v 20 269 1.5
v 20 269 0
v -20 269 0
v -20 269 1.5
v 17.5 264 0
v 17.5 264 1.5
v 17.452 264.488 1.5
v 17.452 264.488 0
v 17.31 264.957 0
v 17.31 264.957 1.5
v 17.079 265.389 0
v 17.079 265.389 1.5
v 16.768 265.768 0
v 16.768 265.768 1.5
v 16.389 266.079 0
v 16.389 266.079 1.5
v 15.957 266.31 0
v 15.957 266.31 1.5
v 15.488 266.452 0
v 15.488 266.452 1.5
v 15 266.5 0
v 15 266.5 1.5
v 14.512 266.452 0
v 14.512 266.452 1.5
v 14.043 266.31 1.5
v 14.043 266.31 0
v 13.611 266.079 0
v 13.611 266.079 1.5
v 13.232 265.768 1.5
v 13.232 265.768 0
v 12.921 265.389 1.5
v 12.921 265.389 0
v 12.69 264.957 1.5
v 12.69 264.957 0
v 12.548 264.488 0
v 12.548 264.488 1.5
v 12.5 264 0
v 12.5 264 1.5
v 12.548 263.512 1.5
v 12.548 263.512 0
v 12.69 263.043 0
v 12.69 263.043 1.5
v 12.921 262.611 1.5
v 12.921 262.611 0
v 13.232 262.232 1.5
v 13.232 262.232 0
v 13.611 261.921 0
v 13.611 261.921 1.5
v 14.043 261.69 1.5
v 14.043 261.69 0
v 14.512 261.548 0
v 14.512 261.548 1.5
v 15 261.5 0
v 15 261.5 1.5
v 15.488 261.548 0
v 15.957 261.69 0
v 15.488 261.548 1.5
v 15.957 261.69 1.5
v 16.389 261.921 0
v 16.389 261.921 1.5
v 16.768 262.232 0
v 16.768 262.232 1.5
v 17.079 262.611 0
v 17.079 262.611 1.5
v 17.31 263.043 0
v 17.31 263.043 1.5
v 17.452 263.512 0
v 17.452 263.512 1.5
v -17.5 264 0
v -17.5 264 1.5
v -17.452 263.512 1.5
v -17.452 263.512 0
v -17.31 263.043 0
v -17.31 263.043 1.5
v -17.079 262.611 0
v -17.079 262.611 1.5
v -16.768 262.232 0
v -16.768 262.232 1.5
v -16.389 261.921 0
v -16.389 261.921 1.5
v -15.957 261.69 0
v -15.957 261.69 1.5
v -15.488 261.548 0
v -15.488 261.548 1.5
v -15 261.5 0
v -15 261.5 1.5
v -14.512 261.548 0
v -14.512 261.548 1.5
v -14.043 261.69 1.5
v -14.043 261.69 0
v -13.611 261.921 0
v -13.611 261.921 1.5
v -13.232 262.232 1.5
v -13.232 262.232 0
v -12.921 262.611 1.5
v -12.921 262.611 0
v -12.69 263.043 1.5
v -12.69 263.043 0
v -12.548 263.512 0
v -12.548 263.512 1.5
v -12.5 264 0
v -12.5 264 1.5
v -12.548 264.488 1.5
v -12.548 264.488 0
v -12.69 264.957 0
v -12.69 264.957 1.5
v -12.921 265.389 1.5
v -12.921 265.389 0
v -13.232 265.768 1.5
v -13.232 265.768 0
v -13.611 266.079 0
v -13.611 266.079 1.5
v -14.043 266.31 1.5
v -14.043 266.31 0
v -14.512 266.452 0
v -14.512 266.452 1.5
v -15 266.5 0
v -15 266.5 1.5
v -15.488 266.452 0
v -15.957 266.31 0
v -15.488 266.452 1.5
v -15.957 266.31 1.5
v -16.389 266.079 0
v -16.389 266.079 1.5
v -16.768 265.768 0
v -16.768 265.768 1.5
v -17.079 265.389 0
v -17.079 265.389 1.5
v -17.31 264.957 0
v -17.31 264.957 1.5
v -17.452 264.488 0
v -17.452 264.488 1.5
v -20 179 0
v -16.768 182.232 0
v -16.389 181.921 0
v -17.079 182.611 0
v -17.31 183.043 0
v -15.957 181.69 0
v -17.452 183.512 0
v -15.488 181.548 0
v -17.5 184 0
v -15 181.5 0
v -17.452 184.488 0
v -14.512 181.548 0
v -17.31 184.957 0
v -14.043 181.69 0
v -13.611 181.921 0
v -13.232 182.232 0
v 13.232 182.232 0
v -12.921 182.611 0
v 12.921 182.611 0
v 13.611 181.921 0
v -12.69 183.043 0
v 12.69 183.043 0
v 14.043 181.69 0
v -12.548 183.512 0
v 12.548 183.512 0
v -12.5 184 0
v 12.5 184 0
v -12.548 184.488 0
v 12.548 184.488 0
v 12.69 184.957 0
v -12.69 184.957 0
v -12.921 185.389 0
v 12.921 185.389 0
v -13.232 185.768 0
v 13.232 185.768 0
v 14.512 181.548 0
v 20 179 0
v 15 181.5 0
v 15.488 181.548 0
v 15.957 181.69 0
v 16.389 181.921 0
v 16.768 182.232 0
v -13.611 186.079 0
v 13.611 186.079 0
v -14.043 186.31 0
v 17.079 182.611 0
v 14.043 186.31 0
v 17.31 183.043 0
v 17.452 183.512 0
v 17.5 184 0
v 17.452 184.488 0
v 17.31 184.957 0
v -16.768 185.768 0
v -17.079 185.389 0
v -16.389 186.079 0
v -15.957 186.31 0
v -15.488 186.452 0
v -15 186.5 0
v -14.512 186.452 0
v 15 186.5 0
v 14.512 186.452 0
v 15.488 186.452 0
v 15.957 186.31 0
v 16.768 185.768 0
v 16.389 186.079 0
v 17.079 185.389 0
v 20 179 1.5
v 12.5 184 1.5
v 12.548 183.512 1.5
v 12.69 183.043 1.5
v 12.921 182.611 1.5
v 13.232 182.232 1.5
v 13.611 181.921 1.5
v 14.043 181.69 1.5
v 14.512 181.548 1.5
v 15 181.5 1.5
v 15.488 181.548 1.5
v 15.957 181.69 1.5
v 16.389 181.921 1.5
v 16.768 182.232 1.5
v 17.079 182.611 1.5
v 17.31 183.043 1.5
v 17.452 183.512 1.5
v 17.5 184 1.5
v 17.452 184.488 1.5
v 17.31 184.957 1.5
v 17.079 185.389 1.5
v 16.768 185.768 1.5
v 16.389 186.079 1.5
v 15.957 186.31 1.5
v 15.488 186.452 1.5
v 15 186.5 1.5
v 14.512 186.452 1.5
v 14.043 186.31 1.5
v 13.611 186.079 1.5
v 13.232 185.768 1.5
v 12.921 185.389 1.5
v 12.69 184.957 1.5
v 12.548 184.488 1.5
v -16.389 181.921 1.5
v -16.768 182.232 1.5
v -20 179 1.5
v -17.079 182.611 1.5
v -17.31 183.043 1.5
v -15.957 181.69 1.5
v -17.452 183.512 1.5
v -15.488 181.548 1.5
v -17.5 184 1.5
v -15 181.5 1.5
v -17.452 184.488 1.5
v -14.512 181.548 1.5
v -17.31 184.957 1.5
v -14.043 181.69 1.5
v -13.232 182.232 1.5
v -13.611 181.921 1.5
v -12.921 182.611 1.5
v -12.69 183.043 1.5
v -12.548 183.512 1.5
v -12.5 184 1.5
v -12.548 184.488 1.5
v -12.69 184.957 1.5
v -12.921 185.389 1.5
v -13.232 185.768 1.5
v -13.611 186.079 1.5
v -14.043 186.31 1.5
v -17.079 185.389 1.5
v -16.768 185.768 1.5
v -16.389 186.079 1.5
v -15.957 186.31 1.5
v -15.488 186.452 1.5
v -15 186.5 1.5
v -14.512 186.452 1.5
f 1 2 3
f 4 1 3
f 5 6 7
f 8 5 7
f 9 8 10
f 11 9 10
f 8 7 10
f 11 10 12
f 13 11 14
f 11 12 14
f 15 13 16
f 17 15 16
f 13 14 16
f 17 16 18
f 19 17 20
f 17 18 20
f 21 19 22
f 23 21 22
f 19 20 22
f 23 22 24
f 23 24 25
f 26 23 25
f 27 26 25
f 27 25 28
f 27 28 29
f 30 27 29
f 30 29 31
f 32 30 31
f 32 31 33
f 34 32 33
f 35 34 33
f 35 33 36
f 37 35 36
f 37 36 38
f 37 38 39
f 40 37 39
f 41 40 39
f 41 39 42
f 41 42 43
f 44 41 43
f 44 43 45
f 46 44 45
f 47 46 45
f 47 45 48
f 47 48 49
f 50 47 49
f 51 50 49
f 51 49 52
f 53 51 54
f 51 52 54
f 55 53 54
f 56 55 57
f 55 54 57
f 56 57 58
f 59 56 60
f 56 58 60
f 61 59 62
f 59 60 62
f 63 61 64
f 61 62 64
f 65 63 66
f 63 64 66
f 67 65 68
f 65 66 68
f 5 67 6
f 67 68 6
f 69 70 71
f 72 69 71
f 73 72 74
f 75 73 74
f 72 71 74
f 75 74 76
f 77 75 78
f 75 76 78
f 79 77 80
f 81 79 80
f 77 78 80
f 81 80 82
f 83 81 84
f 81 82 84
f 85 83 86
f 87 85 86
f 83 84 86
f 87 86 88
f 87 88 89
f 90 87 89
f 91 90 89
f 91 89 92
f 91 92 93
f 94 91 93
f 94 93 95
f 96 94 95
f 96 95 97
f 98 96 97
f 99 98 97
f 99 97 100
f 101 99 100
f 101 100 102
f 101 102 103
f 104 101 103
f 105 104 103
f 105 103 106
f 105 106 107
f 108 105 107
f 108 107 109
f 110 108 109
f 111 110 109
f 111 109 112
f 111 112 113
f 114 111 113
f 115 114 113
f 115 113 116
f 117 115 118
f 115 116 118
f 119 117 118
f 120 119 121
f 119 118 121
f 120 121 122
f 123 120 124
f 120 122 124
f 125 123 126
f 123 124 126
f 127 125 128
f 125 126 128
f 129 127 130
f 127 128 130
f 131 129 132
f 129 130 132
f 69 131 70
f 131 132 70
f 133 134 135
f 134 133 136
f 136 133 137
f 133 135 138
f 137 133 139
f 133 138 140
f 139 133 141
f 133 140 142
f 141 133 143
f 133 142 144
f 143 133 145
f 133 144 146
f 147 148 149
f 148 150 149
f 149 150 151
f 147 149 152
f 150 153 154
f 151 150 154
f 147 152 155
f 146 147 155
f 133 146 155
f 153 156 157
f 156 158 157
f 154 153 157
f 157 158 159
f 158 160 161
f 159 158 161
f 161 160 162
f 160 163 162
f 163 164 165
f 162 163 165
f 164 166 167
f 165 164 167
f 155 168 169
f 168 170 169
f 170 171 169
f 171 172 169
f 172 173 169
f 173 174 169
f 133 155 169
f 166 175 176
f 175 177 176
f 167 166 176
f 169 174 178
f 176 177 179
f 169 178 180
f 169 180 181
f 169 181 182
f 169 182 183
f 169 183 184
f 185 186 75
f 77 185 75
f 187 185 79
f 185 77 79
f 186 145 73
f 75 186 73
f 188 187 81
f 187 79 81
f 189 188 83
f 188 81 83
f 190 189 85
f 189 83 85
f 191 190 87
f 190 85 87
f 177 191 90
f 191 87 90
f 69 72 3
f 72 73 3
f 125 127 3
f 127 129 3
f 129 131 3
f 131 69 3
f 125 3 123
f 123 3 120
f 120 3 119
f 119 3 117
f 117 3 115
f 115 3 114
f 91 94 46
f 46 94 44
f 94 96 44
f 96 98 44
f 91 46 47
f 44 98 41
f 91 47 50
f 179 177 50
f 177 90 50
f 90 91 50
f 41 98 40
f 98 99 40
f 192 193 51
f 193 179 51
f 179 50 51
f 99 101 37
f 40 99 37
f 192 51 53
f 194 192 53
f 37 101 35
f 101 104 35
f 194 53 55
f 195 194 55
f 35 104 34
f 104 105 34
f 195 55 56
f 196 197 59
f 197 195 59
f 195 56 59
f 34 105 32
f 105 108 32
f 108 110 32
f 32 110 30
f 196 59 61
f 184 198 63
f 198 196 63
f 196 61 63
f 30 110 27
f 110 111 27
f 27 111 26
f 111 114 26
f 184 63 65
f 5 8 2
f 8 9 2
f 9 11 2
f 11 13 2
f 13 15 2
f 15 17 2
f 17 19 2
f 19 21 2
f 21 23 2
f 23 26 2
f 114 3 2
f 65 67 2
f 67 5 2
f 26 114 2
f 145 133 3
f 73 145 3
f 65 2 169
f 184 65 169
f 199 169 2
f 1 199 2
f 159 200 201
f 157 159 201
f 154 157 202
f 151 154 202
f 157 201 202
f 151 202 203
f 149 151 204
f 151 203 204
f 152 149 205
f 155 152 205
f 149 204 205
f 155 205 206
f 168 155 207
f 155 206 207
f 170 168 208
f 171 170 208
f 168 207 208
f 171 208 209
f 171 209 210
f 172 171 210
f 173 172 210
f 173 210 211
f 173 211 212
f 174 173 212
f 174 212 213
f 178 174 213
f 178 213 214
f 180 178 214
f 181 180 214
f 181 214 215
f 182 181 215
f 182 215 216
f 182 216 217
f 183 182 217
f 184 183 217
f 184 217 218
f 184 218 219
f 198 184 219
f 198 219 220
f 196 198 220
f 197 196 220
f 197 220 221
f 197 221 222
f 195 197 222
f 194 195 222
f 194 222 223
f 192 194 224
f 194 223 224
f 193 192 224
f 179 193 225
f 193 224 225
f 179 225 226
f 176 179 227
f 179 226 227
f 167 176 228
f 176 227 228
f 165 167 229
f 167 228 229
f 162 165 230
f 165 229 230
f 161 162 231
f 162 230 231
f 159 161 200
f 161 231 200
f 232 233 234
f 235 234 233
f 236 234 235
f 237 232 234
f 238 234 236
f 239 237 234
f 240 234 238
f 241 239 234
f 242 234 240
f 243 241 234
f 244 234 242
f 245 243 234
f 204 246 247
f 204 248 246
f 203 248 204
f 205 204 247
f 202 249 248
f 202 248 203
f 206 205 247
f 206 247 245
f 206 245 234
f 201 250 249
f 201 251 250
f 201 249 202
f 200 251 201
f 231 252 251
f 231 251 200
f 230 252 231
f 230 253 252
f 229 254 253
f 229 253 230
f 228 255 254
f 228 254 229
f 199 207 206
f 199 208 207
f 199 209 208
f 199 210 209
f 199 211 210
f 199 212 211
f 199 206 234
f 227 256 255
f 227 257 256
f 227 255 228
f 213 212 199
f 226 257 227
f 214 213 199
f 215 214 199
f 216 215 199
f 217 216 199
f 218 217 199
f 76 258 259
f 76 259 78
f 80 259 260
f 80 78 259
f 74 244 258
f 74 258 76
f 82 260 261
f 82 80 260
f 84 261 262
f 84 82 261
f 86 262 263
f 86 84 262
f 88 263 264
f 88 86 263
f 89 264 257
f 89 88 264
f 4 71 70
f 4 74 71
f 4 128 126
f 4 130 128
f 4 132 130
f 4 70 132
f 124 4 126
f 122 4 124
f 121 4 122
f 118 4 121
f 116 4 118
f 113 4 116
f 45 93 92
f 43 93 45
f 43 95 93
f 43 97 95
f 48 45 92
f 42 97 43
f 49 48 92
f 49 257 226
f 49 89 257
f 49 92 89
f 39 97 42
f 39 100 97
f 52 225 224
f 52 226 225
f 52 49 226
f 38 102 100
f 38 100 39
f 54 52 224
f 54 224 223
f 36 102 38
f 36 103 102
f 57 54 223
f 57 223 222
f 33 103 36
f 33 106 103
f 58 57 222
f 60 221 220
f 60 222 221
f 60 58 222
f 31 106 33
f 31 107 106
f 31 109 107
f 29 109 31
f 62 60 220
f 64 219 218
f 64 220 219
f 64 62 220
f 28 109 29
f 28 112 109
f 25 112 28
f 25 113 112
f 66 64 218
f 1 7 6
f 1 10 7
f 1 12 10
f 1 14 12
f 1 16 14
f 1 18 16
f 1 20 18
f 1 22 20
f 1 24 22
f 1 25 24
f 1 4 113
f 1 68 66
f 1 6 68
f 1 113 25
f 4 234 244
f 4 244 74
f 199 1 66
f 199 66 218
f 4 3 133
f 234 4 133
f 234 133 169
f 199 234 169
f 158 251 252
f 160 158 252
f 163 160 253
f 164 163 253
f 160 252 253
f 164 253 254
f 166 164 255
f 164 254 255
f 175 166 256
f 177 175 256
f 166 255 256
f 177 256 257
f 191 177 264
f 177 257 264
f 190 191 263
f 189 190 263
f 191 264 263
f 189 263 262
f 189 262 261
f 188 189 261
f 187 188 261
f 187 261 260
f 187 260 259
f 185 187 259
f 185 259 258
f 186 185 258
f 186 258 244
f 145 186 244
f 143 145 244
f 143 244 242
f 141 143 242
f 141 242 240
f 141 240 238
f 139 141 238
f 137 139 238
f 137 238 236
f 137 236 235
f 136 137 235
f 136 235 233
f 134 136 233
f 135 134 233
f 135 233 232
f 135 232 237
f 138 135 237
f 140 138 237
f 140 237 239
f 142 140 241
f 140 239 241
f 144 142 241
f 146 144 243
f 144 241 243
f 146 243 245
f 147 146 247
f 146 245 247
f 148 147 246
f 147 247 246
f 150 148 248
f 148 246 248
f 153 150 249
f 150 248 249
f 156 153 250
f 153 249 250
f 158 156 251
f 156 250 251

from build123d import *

# Parameters (mm, degrees)
SKETCH1_W           = 40
SKETCH1_H           = 41
BOSS_EXTRUDE1_DEPTH = 1.5
SKETCH2_R           = 2.5
CUT_EXTRUDE1_DEPTH  = 270.746640387


with BuildPart() as part:
    # Sketch1 → Boss-Extrude1 (new body)
    with BuildSketch(Plane.XY):
        Polygon((10, 269), (-10, 269), (-20, 269), (-20, 261), (-20, 220), (20, 220), (20, 261), (20, 269), align=None)
        with Locations((0, 199.5)):
            Rectangle(SKETCH1_W, SKETCH1_H)
    extrude(amount=BOSS_EXTRUDE1_DEPTH)

    # Sketch2 → Cut-Extrude1 (cut, through all)
    with BuildSketch(Plane.XY.offset(1.5)):
        with Locations((15, 264)):
            Circle(SKETCH2_R)
        with Locations(Location((15, 184, 0), (0, 0, 180))):
            Circle(SKETCH2_R)
        with Locations((-15, 184)):
            Circle(SKETCH2_R)
        with Locations(Location((-15, 264, 0), (0, 0, 180))):
            Circle(SKETCH2_R)
    extrude(amount=-CUT_EXTRUDE1_DEPTH, mode=Mode.SUBTRACT)


solid = part.part
